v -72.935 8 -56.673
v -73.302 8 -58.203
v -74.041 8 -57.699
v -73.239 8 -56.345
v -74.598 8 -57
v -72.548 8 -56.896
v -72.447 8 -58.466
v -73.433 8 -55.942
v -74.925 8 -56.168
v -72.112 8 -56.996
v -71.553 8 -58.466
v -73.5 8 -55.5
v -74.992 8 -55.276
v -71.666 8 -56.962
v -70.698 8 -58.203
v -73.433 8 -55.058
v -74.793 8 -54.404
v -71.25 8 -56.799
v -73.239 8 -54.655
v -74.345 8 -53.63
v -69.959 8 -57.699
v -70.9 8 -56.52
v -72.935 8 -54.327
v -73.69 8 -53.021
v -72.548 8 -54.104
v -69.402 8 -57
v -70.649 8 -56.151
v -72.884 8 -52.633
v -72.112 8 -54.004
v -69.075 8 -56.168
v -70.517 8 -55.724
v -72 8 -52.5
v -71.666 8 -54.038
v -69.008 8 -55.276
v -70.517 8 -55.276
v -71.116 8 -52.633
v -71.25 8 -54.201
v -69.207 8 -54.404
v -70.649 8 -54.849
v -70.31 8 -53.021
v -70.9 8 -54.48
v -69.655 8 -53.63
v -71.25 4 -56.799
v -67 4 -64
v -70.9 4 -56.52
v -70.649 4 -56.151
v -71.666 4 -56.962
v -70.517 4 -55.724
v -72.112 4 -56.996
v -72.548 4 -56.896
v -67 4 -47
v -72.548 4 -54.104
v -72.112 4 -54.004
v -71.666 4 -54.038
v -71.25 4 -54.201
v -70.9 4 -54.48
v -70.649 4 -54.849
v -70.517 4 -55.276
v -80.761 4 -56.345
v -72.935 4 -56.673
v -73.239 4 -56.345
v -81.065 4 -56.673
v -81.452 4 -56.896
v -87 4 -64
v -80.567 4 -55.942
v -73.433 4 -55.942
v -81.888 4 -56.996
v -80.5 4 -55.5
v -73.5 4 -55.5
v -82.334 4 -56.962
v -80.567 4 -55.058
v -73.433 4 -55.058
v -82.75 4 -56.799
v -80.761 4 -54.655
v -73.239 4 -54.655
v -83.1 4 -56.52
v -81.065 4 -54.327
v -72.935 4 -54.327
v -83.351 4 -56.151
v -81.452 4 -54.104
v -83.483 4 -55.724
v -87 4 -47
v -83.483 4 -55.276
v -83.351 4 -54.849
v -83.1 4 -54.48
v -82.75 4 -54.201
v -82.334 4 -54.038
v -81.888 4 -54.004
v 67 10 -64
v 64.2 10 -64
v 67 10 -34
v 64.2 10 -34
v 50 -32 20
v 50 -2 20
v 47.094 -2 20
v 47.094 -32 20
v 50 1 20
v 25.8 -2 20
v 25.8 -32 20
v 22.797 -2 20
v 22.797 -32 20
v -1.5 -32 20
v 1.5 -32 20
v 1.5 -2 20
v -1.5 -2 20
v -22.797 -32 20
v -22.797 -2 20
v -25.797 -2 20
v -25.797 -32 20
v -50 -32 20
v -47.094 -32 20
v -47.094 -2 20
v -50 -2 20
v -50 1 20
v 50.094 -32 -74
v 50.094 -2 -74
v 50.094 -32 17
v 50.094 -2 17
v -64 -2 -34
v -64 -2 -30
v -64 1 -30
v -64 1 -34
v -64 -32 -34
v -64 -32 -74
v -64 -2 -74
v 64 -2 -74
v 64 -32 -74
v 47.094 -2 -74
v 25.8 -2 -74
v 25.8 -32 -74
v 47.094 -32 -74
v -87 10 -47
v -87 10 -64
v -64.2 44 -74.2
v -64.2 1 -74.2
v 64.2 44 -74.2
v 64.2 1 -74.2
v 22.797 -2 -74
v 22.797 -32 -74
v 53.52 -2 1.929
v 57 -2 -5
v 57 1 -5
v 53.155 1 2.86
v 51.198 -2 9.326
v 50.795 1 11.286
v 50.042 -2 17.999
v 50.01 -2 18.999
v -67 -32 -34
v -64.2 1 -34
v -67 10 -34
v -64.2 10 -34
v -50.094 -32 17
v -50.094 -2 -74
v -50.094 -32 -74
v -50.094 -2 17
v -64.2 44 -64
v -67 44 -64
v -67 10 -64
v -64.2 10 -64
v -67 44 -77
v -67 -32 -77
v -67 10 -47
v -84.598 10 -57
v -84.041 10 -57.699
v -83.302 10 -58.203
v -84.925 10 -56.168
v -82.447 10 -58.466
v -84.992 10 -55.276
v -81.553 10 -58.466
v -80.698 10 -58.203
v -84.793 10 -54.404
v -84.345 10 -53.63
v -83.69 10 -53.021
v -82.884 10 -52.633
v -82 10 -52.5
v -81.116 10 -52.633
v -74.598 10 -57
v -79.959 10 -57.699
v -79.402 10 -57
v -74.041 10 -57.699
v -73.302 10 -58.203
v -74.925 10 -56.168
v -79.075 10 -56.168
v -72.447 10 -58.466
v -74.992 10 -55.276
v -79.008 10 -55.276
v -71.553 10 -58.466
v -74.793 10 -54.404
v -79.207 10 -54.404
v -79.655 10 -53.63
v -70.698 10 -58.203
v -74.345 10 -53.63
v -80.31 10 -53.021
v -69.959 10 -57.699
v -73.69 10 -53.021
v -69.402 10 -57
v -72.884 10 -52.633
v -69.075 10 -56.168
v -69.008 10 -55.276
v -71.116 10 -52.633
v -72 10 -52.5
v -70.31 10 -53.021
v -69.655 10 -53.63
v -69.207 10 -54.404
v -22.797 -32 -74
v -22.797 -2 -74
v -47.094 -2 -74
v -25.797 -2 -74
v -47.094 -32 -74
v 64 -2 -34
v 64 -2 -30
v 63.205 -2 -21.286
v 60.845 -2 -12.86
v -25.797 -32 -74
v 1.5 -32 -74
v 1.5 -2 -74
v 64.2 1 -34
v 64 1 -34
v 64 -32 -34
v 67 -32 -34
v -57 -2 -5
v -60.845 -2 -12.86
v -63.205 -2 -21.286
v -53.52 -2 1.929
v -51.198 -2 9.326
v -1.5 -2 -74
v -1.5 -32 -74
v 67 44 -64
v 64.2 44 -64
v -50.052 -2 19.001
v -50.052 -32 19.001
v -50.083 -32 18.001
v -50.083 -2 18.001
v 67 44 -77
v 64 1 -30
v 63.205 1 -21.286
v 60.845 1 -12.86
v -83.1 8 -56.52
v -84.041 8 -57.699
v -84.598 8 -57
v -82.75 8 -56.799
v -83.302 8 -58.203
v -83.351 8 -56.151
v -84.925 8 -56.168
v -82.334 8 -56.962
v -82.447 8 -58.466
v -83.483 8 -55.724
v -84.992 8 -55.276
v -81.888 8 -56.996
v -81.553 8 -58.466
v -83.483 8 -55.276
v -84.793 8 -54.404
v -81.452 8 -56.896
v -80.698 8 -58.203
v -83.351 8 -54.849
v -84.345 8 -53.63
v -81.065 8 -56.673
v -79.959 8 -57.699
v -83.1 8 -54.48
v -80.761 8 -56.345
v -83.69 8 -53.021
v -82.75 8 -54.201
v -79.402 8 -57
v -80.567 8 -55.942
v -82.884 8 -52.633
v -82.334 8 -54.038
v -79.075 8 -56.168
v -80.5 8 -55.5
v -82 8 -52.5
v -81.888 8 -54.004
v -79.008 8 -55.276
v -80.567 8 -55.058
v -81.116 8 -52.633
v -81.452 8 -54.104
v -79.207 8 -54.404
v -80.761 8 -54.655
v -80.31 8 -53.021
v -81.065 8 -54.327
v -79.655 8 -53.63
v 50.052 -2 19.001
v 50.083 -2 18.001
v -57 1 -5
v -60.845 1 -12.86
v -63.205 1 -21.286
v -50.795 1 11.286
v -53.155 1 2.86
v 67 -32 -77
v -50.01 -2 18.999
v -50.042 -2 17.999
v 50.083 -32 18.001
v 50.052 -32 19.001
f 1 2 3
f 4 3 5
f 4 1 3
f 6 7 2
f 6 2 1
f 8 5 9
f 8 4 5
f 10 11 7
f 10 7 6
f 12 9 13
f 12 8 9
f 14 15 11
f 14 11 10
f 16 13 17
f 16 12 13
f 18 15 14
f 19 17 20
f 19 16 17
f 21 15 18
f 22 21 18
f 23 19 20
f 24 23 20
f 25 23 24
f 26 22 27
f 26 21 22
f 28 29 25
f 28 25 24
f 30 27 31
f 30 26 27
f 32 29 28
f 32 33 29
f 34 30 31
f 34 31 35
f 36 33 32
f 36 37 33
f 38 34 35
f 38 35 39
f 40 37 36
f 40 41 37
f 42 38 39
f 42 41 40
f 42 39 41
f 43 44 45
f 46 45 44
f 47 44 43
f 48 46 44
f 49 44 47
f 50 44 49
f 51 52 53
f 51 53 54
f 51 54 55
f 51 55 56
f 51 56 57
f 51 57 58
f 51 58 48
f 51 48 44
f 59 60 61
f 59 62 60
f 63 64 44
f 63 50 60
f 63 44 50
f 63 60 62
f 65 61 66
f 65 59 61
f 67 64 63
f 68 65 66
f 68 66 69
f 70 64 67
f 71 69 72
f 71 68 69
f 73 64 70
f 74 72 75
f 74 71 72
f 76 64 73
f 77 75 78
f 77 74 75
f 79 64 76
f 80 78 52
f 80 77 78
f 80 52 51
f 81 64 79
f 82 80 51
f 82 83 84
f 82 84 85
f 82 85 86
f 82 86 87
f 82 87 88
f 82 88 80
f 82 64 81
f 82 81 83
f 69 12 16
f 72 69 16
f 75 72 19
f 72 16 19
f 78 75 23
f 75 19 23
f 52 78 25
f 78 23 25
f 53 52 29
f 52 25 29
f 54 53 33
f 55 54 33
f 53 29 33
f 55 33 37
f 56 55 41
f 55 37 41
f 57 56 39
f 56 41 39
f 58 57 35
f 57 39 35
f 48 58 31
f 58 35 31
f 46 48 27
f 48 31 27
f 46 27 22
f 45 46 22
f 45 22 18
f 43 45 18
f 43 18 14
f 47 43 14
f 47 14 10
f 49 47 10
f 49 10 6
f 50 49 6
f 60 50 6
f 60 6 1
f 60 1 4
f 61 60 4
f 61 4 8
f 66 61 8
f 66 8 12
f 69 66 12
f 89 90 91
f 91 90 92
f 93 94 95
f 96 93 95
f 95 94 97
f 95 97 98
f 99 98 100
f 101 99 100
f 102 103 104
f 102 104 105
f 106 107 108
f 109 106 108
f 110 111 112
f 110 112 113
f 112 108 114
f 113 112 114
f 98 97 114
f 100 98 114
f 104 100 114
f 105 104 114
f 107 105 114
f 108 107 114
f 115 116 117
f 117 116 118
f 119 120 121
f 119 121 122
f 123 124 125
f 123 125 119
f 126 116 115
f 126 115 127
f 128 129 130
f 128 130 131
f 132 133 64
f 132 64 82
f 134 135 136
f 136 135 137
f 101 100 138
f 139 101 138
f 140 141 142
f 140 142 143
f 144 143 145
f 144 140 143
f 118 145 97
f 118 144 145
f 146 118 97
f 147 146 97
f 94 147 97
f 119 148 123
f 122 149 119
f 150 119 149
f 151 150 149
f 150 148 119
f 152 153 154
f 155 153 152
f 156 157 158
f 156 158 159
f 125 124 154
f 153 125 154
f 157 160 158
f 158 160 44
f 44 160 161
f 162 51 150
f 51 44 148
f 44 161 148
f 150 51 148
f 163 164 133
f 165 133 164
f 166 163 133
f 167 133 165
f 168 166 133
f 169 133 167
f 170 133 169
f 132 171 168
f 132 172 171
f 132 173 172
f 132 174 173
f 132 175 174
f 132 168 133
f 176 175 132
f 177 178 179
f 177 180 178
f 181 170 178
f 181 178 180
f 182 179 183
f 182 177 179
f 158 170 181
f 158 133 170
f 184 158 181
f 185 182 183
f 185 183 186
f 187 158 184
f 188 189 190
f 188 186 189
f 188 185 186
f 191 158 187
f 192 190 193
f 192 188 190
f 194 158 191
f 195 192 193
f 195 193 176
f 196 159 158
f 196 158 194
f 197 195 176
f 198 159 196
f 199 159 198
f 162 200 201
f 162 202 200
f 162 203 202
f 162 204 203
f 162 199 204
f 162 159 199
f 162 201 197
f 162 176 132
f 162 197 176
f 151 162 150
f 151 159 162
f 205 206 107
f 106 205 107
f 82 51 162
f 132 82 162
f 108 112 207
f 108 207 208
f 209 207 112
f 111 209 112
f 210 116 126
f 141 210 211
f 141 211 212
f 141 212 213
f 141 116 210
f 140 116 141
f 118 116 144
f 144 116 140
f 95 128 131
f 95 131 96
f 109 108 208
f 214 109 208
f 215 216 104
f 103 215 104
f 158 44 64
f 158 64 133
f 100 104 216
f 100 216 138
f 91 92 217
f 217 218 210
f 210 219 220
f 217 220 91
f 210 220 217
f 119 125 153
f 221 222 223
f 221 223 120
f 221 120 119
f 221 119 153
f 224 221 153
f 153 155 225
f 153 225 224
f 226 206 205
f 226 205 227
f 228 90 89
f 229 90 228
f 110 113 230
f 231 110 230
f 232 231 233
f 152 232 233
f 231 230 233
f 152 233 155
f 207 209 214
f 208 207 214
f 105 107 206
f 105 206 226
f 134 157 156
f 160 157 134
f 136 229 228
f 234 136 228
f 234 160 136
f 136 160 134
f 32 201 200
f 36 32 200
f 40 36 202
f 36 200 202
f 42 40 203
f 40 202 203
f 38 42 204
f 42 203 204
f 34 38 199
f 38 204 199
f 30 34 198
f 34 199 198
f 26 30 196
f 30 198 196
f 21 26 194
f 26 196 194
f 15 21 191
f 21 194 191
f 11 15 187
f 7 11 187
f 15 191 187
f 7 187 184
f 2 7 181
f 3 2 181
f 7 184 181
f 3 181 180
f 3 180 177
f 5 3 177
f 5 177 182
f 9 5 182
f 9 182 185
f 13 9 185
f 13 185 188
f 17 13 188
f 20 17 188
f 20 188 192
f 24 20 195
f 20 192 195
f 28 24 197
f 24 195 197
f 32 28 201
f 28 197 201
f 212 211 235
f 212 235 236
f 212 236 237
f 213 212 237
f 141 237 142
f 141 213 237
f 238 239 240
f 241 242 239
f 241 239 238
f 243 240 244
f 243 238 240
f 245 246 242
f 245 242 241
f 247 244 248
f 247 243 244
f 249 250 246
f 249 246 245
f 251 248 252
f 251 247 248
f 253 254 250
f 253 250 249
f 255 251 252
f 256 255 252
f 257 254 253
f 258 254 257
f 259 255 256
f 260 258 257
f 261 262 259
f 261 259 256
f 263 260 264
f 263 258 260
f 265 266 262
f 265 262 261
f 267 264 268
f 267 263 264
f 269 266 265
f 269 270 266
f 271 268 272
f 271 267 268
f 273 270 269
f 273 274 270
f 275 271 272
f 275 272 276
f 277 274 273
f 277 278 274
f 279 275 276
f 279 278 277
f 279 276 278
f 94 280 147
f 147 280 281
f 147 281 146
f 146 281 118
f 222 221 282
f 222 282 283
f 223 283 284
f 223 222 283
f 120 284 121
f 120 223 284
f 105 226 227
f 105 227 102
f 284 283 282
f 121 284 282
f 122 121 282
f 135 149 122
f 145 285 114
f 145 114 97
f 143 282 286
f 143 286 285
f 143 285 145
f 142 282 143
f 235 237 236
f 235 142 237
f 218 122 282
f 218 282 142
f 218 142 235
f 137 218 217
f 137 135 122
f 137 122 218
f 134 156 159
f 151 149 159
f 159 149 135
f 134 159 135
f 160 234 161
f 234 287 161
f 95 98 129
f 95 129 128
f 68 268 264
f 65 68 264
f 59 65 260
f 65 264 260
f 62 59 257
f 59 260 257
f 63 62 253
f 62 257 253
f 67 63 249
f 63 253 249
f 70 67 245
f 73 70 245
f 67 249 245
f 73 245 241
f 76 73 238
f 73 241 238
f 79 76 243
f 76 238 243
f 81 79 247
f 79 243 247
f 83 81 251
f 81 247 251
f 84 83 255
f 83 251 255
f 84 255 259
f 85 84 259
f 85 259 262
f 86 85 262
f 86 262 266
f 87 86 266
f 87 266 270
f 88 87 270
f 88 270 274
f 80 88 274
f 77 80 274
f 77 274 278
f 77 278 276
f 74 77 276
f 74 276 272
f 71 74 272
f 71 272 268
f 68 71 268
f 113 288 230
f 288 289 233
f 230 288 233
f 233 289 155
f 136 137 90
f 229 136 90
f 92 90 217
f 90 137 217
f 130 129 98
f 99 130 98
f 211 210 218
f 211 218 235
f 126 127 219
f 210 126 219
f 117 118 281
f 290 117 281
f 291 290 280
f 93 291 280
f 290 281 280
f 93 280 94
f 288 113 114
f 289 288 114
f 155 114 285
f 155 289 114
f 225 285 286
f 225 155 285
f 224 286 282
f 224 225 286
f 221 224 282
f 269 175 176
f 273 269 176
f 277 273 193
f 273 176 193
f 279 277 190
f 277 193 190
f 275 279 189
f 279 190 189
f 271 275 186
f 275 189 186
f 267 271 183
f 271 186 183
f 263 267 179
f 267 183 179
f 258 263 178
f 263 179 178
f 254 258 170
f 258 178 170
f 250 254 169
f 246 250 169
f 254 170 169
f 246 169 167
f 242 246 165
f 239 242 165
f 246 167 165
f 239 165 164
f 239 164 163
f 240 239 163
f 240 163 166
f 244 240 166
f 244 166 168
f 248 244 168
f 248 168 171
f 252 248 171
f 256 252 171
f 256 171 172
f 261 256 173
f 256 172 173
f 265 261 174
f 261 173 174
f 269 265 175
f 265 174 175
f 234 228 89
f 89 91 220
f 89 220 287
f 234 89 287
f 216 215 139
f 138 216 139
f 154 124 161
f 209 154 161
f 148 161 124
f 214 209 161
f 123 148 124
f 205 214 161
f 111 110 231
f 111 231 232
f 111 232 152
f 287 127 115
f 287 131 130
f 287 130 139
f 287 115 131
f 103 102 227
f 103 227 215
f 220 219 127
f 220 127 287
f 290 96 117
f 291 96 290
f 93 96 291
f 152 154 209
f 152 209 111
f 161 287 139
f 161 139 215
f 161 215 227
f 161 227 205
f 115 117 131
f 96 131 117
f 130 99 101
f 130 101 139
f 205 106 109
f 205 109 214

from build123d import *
from build123d.topology import SkipClean

# Parameters (mm, degrees)
SKETCH_1_R           = 10
SKETCH_1_W           = 40
SKETCH_1_H           = 40
EXTRUDE_1_DEPTH      = 2
EXTRUDE_START        = 2
SKETCH_2_R           = 10
EXTRUDE_2_DEPTH      = 2
SKETCH_4_R           = 15
EXTRUDE_3_DEPTH      = 8
EXTRUDE_START_2      = -8
SKETCH_7_R           = 15
SKETCH_7_R_2         = 10
EXTRUDE_4_DEPTH      = 8
SKETCH_11_R          = 15
SKETCH_11_R_2        = 10
EXTRUDE_5_DEPTH      = 8
FILLET_1_R           = 8
EXTRUDE_START_3      = -1
SKETCH_20_R          = 10
EXTRUDE_7_DEPTH      = 1
CUT_EXTRUDE_START    = -4
CUT_EXTRUDE_2_DEPTH  = 4
EXTRUDE_8_DEPTH      = 4
SKETCH_28_R          = 10
EXTRUDE_10_DEPTH     = 4
SKETCH_29_R          = 10
CUT_EXTRUDE_5_DEPTH  = 3
CUT_EXTRUDE_START_2  = -8
CUT_EXTRUDE_6_DEPTH  = 8
SKETCH_32_R          = 10
EXTRUDE_11_DEPTH     = 4
SKETCH_33_W          = 128
SKETCH_33_H          = 1
CUT_EXTRUDE_7_DEPTH  = 100
SKETCH_34_W          = 128
SKETCH_34_H          = 3
EXTRUDE_12_DEPTH     = 42
EXTRUDE_13_DEPTH     = 3
SKETCH_36_W          = 128
SKETCH_36_H          = 3
EXTRUDE_14_DEPTH     = 30
EXTRUDE_15_DEPTH     = 30
SKETCH_40_W          = 128
SKETCH_40_H          = 3
EXTRUDE_16_DEPTH     = 30
SKETCH_41_W          = 3
SKETCH_41_H          = 51
EXTRUDE_17_DEPTH     = 30
SKETCH_42_W          = 128
SKETCH_42_H          = 0.2
SKETCH_42_W_2        = 0.2
SKETCH_42_H_2        = 40
CUT_EXTRUDE_8_DEPTH  = 42
EXTRUDE_18_DEPTH     = 20
CUT_EXTRUDE_9_DEPTH  = 20
SKETCH_45_R          = 5
CUT_EXTRUDE_10_DEPTH = 3
SKETCH_46_W          = 17
SKETCH_46_H          = 6
EXTRUDE_19_DEPTH     = 20
SKETCH_47_W          = 20
SKETCH_47_H          = 6
CUT_EXTRUDE_11_DEPTH = 20
CUT_EXTRUDE_12_DEPTH = 20
SKETCH_49_R          = 3
CUT_EXTRUDE_13_DEPTH = 2
SKETCH_50_W          = 30
SKETCH_50_H          = 33
CUT_EXTRUDE_14_DEPTH = 3
SKETCH_51_W          = 128.4
SKETCH_51_H          = 2.8
EXTRUDE_20_DEPTH     = 1
SKETCH_52_W          = 128
SKETCH_52_H          = 3
SKETCH_52_W_2        = 94.187125454
CUT_EXTRUDE_15_DEPTH = 30
SKETCH_53_W          = 3
SKETCH_53_H          = 40
EXTRUDE_21_DEPTH     = 30
SKETCH_54_W          = 1.5
SKETCH_54_H          = 47
SKETCH_54_W_2        = 3
SKETCH_54_H_2        = 94
SKETCH_54_W_3        = 1.502846805
EXTRUDE_23_DEPTH     = 30
SKETCH_55_W          = 30
SKETCH_55_H          = 34
CUT_EXTRUDE_16_DEPTH = 200


with BuildPart() as part:
    # 草图1 → 凸台-拉伸1 (new body)
    with BuildSketch(Plane(origin=(0, 0, 0), x_dir=(1, 0, 0), z_dir=(0, 1, 0))):
        with BuildLine():
            Line((0, -20), (50, -20))
            Line((50, -20), (57, -20))
            ThreePointArc((57, -20), (76.798989873, -11.798989873), (85, 8))
            Line((85, 8), (85, 52))
            Line((85, 52), (43, 52))
            Line((43, 52), (43, 72))
            Line((43, 72), (-43, 72))
            Line((-43, 72), (-43, 52))
            Line((-43, 52), (-85, 52))
            Line((-85, 52), (-85, 50))
            Line((-85, 50), (-85, 8))
            ThreePointArc((-85, 8), (-76.798989873, -11.798989873), (-57, -20))
            Line((-57, -20), (-50, -20))
            Line((-50, -20), (0, -20))
        make_face()
        with Locations(Location((18, 0, 0), (0, 0, 270))):
            Circle(SKETCH_1_R, mode=Mode.SUBTRACT)
        with Locations(Location((-18, 0, 0), (0, 0, 270))):
            Circle(SKETCH_1_R, mode=Mode.SUBTRACT)
        with Locations((-21, 50)):
            Rectangle(SKETCH_1_W, SKETCH_1_H, mode=Mode.SUBTRACT)
        with Locations((21, 50)):
            Rectangle(SKETCH_1_W, SKETCH_1_H, mode=Mode.SUBTRACT)
        with Locations((-63, 30)):
            Rectangle(SKETCH_1_W, SKETCH_1_H, mode=Mode.SUBTRACT)
        with Locations((63, 30)):
            Rectangle(SKETCH_1_W, SKETCH_1_H, mode=Mode.SUBTRACT)
    extrude(amount=EXTRUDE_1_DEPTH)

    # 草图2 → 凸台-拉伸2 (add)
    with SkipClean():  # the faces are left unmerged after this step: merging them gives an invalid solid
        with BuildSketch(Plane.XZ.offset(EXTRUDE_START)):
            with BuildLine():
                Line((-85, -8), (-85, -52))
                Line((-85, -52), (-43, -52))
                Line((-43, -52), (-43, -72))
                Line((-43, -72), (43, -72))
                Line((43, -72), (43, -52))
                Line((43, -52), (85, -52))
                Line((85, -52), (85, -8))
                ThreePointArc((85, -8), (76.798989873, 11.798989873), (57, 20))
                Line((57, 20), (-57, 20))
                ThreePointArc((-57, 20), (-76.798989873, 11.798989873), (-85, -8))
            make_face()
            with Locations(Location((-18, 0, 0), (0, 0, 270))):
                Circle(SKETCH_2_R, mode=Mode.SUBTRACT)
            with Locations(Location((18, 0, 0), (0, 0, 270))):
                Circle(SKETCH_2_R, mode=Mode.SUBTRACT)
        extrude(amount=-EXTRUDE_2_DEPTH)

    # 草图4 → 凸台-拉伸3 (add)
    with BuildSketch(Plane(origin=(0, 2, 0), x_dir=(1, 0, 0), z_dir=(0, 1, 0))):
        with BuildLine():
            Line((-50, -20), (0, -20))
            Line((0, -20), (50, -20))
            ThreePointArc((50, -20), (0, 30), (-50, -20))
        make_face()
        with Locations(Location((-18, 0, 0), (0, 0, 270))):
            Circle(SKETCH_4_R, mode=Mode.SUBTRACT)
        with Locations(Location((18, 0, 0), (0, 0, 270))):
            Circle(SKETCH_4_R, mode=Mode.SUBTRACT)
    extrude(amount=EXTRUDE_3_DEPTH)

    # loft up to a face of the part (loft_1)
    loft([Face(Wire([part.edges().sort_by_distance((-28.934529411, 10, -10.268206589))[0]])), Face(Wire([part.edges().sort_by_distance((-25.289686274, 2, -6.845471059))[0]]))], mode=Mode.SUBTRACT)

    # 草图7 → 凸台-拉伸4 (add)
    with BuildSketch(Plane(origin=(0, 10, 0), x_dir=(1, 0, 0), z_dir=(0, 1, 0)).offset(EXTRUDE_START_2)):
        with Locations((-18, 0)):
            Circle(SKETCH_7_R)
        with Locations(Location((-18, 0, 0), (0, 0, 90))):
            Circle(SKETCH_7_R_2, mode=Mode.SUBTRACT)
    extrude(amount=EXTRUDE_4_DEPTH)

    # 切除-放样2: read off the stored shape, not the designer's step
    # 切除-放样2: loft between two sections, ruled curve by curve
    loft_2_from = [
        Edge.make_bspline([(-3.624862246, 10, -4.284321948), (4.943781649, 10, 24.465953561), (-23.806493859, 10, 33.034597456), (-32.375137754, 10, 4.284321948), (-40.943781649, 10, -24.465953561), (-12.193506141, 10, -33.034597456), (-3.624862246, 10, -4.284321948)], [0, 0, 0, 0, 0.5, 0.5, 0.5, 1, 1, 1, 1], 3, [1, 0.333333333, 0.333333333, 1, 0.333333333, 0.333333333, 1]),
    ]
    loft_2_to = [
        Edge.make_bspline([(-10.022055605, 2, -6.029295417), (2.036535229, 2, 9.926593374), (-13.919353562, 2, 21.985184208), (-25.977944395, 2, 6.029295417), (-38.036535229, 2, -9.926593374), (-22.080646438, 2, -21.985184208), (-10.022055605, 2, -6.029295417)], [0, 0, 0, 0, 0.5, 0.5, 0.5, 1, 1, 1, 1], 3, [1, 0.333333333, 0.333333333, 1, 0.333333333, 0.333333333, 1]),
    ]
    loft_2 = Solid(Shell([*[Face.make_surface_from_curves(loft_2_from[k], loft_2_to[k]) for k in range(1)], Face(Wire(loft_2_from)), Face(Wire(loft_2_to))]))
    add(loft_2, mode=Mode.SUBTRACT)

    # 草图11 → 凸台-拉伸5 (add)
    with BuildSketch(Plane(origin=(0, 10, 0), x_dir=(1, 0, 0), z_dir=(0, 1, 0)).offset(EXTRUDE_START_2)):
        with Locations((18, 0)):
            Circle(SKETCH_11_R)
        with Locations(Location((18, 0, 0), (0, 0, 90))):
            Circle(SKETCH_11_R_2, mode=Mode.SUBTRACT)
    extrude(amount=EXTRUDE_5_DEPTH)

    # 切除-放样3: read off the stored shape, not the designer's step
    # 切除-放样3: loft between two sections, ruled curve by curve
    loft_3_from = [
        Edge.make_bspline([(32.65702084, 10, -3.189316556), (39.035653951, 10, 26.124725125), (9.721612271, 10, 32.503358236), (3.34297916, 10, 3.189316556), (-3.035653951, 10, -26.124725125), (26.278387729, 10, -32.503358236), (32.65702084, 10, -3.189316556)], [0, 0, 0, 0, 0.5, 0.5, 0.5, 1, 1, 1, 1], 3, [1, 0.333333333, 0.333333333, 1, 0.333333333, 0.333333333, 1]),
    ]
    loft_3_to = [
        Edge.make_bspline([(26.664439789, 2, -4.992743049), (36.649925886, 2, 12.336136528), (19.321046309, 2, 22.321622626), (9.335560211, 2, 4.992743049), (-0.649925886, 2, -12.336136528), (16.678953691, 2, -22.321622626), (26.664439789, 2, -4.992743049)], [0, 0, 0, 0, 0.5, 0.5, 0.5, 1, 1, 1, 1], 3, [1, 0.333333333, 0.333333333, 1, 0.333333333, 0.333333333, 1]),
    ]
    loft_3 = Solid(Shell([*[Face.make_surface_from_curves(loft_3_from[k], loft_3_to[k]) for k in range(1)], Face(Wire(loft_3_from)), Face(Wire(loft_3_to))]))
    add(loft_3, mode=Mode.SUBTRACT)

    # 圆角1
    fillet_1_edges = [part.edges().sort_by_distance(p)[0] for p in [
        (0, 10, -30),
    ]]
    fillet(fillet_1_edges, radius=FILLET_1_R - 0.0001)  # a hair under: the kernel refuses the full size

    # 草图20 → 凸台-拉伸7 (add)
    with BuildSketch(Plane(origin=(0, 2, 0), x_dir=(1, 0, 0), z_dir=(0, 1, 0)).offset(EXTRUDE_START_3)):
        with Locations(Location((-18, 0, 0), (0, 0, 90))):
            Circle(SKETCH_20_R)
        with Locations(Location((18, 0, 0), (0, 0, 90))):
            Circle(SKETCH_20_R)
    extrude(amount=EXTRUDE_7_DEPTH)

    # 草图21 → 切除-拉伸2 (cut)
    with BuildSketch(Plane(origin=(0, 2, 0), x_dir=(1, 0, 0), z_dir=(0, 1, 0)).offset(CUT_EXTRUDE_START)):
        with BuildLine():
            Line((-50, -20), (-103.463459811, -20))
            Line((-103.463459811, -20), (-103.463459811, 85.086510942))
            Line((-103.463459811, 85.086510942), (103.21519716, 85.086510942))
            Line((103.21519716, 85.086510942), (103.21519716, -20))
            Line((103.21519716, -20), (50, -20))
            ThreePointArc((50, -20), (0, 30), (-50, -20))
        make_face()
    extrude(amount=CUT_EXTRUDE_2_DEPTH, mode=Mode.SUBTRACT)

    # 草图22 → 凸台-拉伸8 (add)
    with BuildSketch(Plane.XZ.offset(2)):
        with BuildLine():
            Line((-64, -30), (-64, -74))
            Line((-64, -74), (0, -74))
            Line((0, -74), (64, -74))
            Line((64, -74), (64, -30))
            ThreePointArc((64, -30), (62.216982092, -17.019245014), (57, -5))
            ThreePointArc((57, -5), (51.783017908, 7.019245014), (50, 20))
            ThreePointArc((50, 20), (0, -30), (-50, 20))
            ThreePointArc((-50, 20), (-51.783017908, 7.019245014), (-57, -5))
            ThreePointArc((-57, -5), (-62.216982092, -17.019245014), (-64, -30))
        make_face()
    extrude(amount=-EXTRUDE_8_DEPTH)

    # 草图28 → 凸台-拉伸10 (add)
    with BuildSketch(Plane.XZ.offset(2)):
        with Locations((-18, 0)):
            Circle(SKETCH_28_R)
        with Locations((18, 0)):
            Circle(SKETCH_28_R)
    extrude(amount=-EXTRUDE_10_DEPTH)

    # 草图29 → 切除-拉伸5 (cut)
    with BuildSketch(Plane(origin=(0, 2, 0), x_dir=(1, 0, 0), z_dir=(0, 1, 0))):
        with Locations(Location((-18, 0, 0), (0, 0, 270))):
            Circle(SKETCH_29_R)
        with Locations(Location((18, 0, 0), (0, 0, 270))):
            Circle(SKETCH_29_R)
    extrude(amount=-CUT_EXTRUDE_5_DEPTH, mode=Mode.SUBTRACT)

    # 草图31 → 切除-拉伸6 (cut)
    with BuildSketch(Plane(origin=(0, 10, 0), x_dir=(1, 0, 0), z_dir=(0, 1, 0)).offset(CUT_EXTRUDE_START_2)):
        with BuildLine():
            Line((-50, -20), (50, -20))
            ThreePointArc((50, -20), (0, 30), (-50, -20))
        make_face()
    extrude(amount=CUT_EXTRUDE_6_DEPTH, mode=Mode.SUBTRACT)

    # 草图32 → 凸台-拉伸11 (add)
    with BuildSketch(Plane(origin=(0, 2, 0), x_dir=(1, 0, 0), z_dir=(0, 1, 0))):
        with Locations((-18, 0)):
            Circle(SKETCH_32_R)
        with Locations((18, 0)):
            Circle(SKETCH_32_R)
    extrude(amount=-EXTRUDE_11_DEPTH)

    # 草图33 → 切除-拉伸7 (cut)
    with BuildSketch(Plane(origin=(0, 0, -74), x_dir=(-1, 0, 0), z_dir=(0, 0, -1))):
        with Locations((0, 1.5)):
            Rectangle(SKETCH_33_W, SKETCH_33_H)
    extrude(amount=-CUT_EXTRUDE_7_DEPTH, mode=Mode.SUBTRACT)



with BuildPart() as body_2:
    # 草图34 → 凸台-拉伸12 (new body)
    with BuildSketch(Plane(origin=(0, 1, 0), x_dir=(1, 0, 0), z_dir=(0, 1, 0))):
        Polygon((64, 77), (64, 74), (64, 34), (67, 34), (67, 77), align=None)
        with Locations((0, 75.5)):
            Rectangle(SKETCH_34_W, SKETCH_34_H)
        Polygon((-64, 34), (-64, 74), (-64, 77), (-67, 77), (-67, 34), align=None)
    extrude(amount=EXTRUDE_12_DEPTH)


with BuildPart() as part_1:
    add(part.part)

    add(body_2.part)  # 凸台-拉伸13 merges body 2
    # 草图35 → 凸台-拉伸13 (add)
    with BuildSketch(Plane.XZ.offset(2)):
        Polygon((-64, -34), (-67, -34), (-67, -77), (67, -77), (67, -34), (64, -34), (64, -74), (-64, -74), align=None)
    extrude(amount=-EXTRUDE_13_DEPTH)

    # 草图36 → 凸台-拉伸14 (add)
    with BuildSketch(Plane.XZ.offset(2)):
        Polygon((64, -34), (64, -74), (64, -77), (67, -77), (67, -34), align=None)
        with Locations((0, -75.5)):
            Rectangle(SKETCH_36_W, SKETCH_36_H)
        Polygon((-64, -34), (-67, -34), (-67, -77), (-64, -77), (-64, -74), align=None)
    extrude(amount=EXTRUDE_14_DEPTH)

    # 草图37 → 凸台-拉伸15 (add)
    with BuildSketch(Plane(origin=(0, -2, 0), x_dir=(-1, 0, 0), z_dir=(0, -1, 0))):
        with BuildLine():
            Line((0, -17), (-50.093562727, -17))
            ThreePointArc((-50.093562727, -17), (-50.07016636, -18.500729321), (-50, -20))
            Line((-50, -20), (50, -20))
            ThreePointArc((50, -20), (50.07016636, -18.500729321), (50.093562727, -17))
            Line((50.093562727, -17), (0, -17))
        make_face()
    extrude(amount=EXTRUDE_15_DEPTH)

    # 草图40 → 凸台-拉伸16 (add)
    with BuildSketch(Plane.XZ.offset(2)):
        with Locations((0, -35.5)):
            Rectangle(SKETCH_40_W, SKETCH_40_H)
    extrude(amount=EXTRUDE_16_DEPTH)

    # 草图41 → 凸台-拉伸17 (add)
    with BuildSketch(Plane.XZ.offset(2)):
        with Locations((-48.593562727, -8.5)):
            Rectangle(SKETCH_41_W, SKETCH_41_H)
        with Locations((48.593562727, -8.5)):
            Rectangle(SKETCH_41_W, SKETCH_41_H)
    extrude(amount=EXTRUDE_17_DEPTH)

    # 草图42 → 切除-拉伸8 (cut)
    with BuildSketch(Plane(origin=(0, 43, 0), x_dir=(1, 0, 0), z_dir=(0, 1, 0))):
        with Locations((0, 74.1)):
            Rectangle(SKETCH_42_W, SKETCH_42_H)
        with Locations((-64.1, 74.1)):
            Rectangle(SKETCH_42_W_2, SKETCH_42_H)
        with Locations((-64.1, 54)):
            Rectangle(SKETCH_42_W_2, SKETCH_42_H_2)
        with Locations((64.1, 54)):
            Rectangle(SKETCH_42_W_2, SKETCH_42_H_2)
        with Locations((64.1, 74.1)):
            Rectangle(SKETCH_42_W_2, SKETCH_42_H)
    extrude(amount=-CUT_EXTRUDE_8_DEPTH, mode=Mode.SUBTRACT)

    # 草图43 → 凸台-拉伸18 (add)
    with BuildSketch(Plane.ZY.offset(67)):
        Polygon((-45.5, -2), (-65.5, -2), (-65.5, 4), (-55.5, 4), (-45.5, 4), align=None)
    extrude(amount=EXTRUDE_18_DEPTH)

    # 草图44 → 切除-拉伸9 (cut)
    with BuildSketch(Plane(origin=(0, 4, 0), x_dir=(1, 0, 0), z_dir=(0, 1, 0))):
        with BuildLine():
            ThreePointArc((-74.4, 55.5), (-76.005023076, 57.902086785), (-78.838477631, 57.338477631))
            Line((-78.838477631, 57.338477631), (-75.161522369, 53.661522369))
            ThreePointArc((-75.161522369, 53.661522369), (-74.597913215, 54.505023076), (-74.4, 55.5))
        make_face()
        with BuildLine():
            Line((-75.161522369, 53.661522369), (-78.838477631, 57.338477631))
            ThreePointArc((-78.838477631, 57.338477631), (-78.838477631, 53.661522369), (-75.161522369, 53.661522369))
        make_face()
    extrude(amount=-CUT_EXTRUDE_9_DEPTH, mode=Mode.SUBTRACT)

    # 草图45 → 切除-拉伸10 (cut)
    with BuildSketch(Plane(origin=(0, 4, 0), x_dir=(1, 0, 0), z_dir=(0, 1, 0))):
        with Locations(Location((-77, 55.5, 0), (0, 0, 270))):
            Circle(SKETCH_45_R)
    extrude(amount=-CUT_EXTRUDE_10_DEPTH, mode=Mode.SUBTRACT)

    # 草图46 → 凸台-拉伸19 (add)
    with BuildSketch(Plane.ZY.offset(67)):
        with Locations((-55.5, 7)):
            Rectangle(SKETCH_46_W, SKETCH_46_H)
    extrude(amount=EXTRUDE_19_DEPTH)

    # 草图47 → 切除-拉伸11 (cut)
    with BuildSketch(Plane.ZY.offset(87)):
        with Locations((-55.5, 1)):
            Rectangle(SKETCH_47_W, SKETCH_47_H)
    extrude(amount=-CUT_EXTRUDE_11_DEPTH, mode=Mode.SUBTRACT)

    # 草图48 → 切除-拉伸12 (cut)
    with BuildSketch(Plane(origin=(0, 10, 0), x_dir=(1, 0, 0), z_dir=(0, 1, 0))):
        with BuildLine():
            ThreePointArc((-83.5, 55.5), (-82, 54), (-80.5, 55.5))
            Line((-80.5, 55.5), (-83.5, 55.5))
        make_face()
        with BuildLine():
            Line((-83.5, 55.5), (-80.5, 55.5))
            ThreePointArc((-80.5, 55.5), (-82, 57), (-83.5, 55.5))
        make_face()
        with BuildLine():
            ThreePointArc((-70.5, 55.5), (-72, 57), (-73.5, 55.5))
            Line((-73.5, 55.5), (-70.5, 55.5))
        make_face()
        with BuildLine():
            Line((-70.5, 55.5), (-73.5, 55.5))
            ThreePointArc((-73.5, 55.5), (-72, 54), (-70.5, 55.5))
        make_face()
    extrude(amount=-CUT_EXTRUDE_12_DEPTH, mode=Mode.SUBTRACT)

    # 草图49 → 切除-拉伸13 (cut)
    with BuildSketch(Plane(origin=(0, 10, 0), x_dir=(1, 0, 0), z_dir=(0, 1, 0))):
        with Locations(Location((-82, 55.5, 0), (0, 0, 270))):
            Circle(SKETCH_49_R)
        with Locations(Location((-72, 55.5, 0), (0, 0, 270))):
            Circle(SKETCH_49_R)
    extrude(amount=-CUT_EXTRUDE_13_DEPTH, mode=Mode.SUBTRACT)

    # 草图50 → 切除-拉伸14 (cut)
    with BuildSketch(Plane.ZY.offset(67)):
        with Locations((-49, 26.5)):
            Rectangle(SKETCH_50_W, SKETCH_50_H)
    extrude(amount=-CUT_EXTRUDE_14_DEPTH, mode=Mode.SUBTRACT)

    # 草图51 → 凸台-拉伸20 (add)
    with BuildSketch(Plane(origin=(0, 43, 0), x_dir=(1, 0, 0), z_dir=(0, 1, 0))):
        with Locations((0, 75.6)):
            Rectangle(SKETCH_51_W, SKETCH_51_H)
        Polygon((-67, 64), (-64.2, 64), (-64.2, 74.2), (-64.2, 77), (-67, 77), align=None)
        Polygon((64.2, 77), (64.2, 74.2), (64.2, 34), (67, 34), (67, 77), align=None)
    extrude(amount=EXTRUDE_20_DEPTH)

    # 草图52 → 切除-拉伸15 (cut)
    with BuildSketch(Plane.XZ.offset(32)):
        with Locations((0, -35.5)):
            Rectangle(SKETCH_52_W, SKETCH_52_H)
        with Locations((0, 18.5)):
            Rectangle(SKETCH_52_W_2, SKETCH_52_H)
    extrude(amount=-CUT_EXTRUDE_15_DEPTH, mode=Mode.SUBTRACT)

    # 草图53 → 凸台-拉伸21 (add)
    with BuildSketch(Plane.XZ.offset(2)):
        with Locations((-48.593562727, -54)):
            Rectangle(SKETCH_53_W, SKETCH_53_H)
        with Locations((48.593562727, -54)):
            Rectangle(SKETCH_53_W, SKETCH_53_H)
    extrude(amount=EXTRUDE_21_DEPTH)

    # 草图54 → 凸台-拉伸23 (add)
    with BuildSketch(Plane.XZ.offset(2)):
        Polygon((-22.796781363, 20), (-24.296781363, 20), (-24.296781363, -27), (-24.296781363, -74), (-22.796781363, -74), align=None)
        with Locations((-25.046781363, -3.5)):
            Rectangle(SKETCH_54_W, SKETCH_54_H)
        with Locations((-25.046781363, -50.5)):
            Rectangle(SKETCH_54_W, SKETCH_54_H)
        with Locations((0, -27)):
            Rectangle(SKETCH_54_W_2, SKETCH_54_H_2)
        with Locations((25.048204766, -3.5)):
            Rectangle(SKETCH_54_W_3, SKETCH_54_H)
        with Locations((23.546781363, -3.5)):
            Rectangle(SKETCH_54_W, SKETCH_54_H)
        with Locations((23.546781363, -50.5)):
            Rectangle(SKETCH_54_W, SKETCH_54_H)
        with Locations((25.048204766, -50.5)):
            Rectangle(SKETCH_54_W_3, SKETCH_54_H)
    extrude(amount=EXTRUDE_23_DEPTH)

    # 草图55 → 切除-拉伸16 (cut)
    with BuildSketch(Plane.ZY.offset(67)):
        with Locations((-49, 27)):
            Rectangle(SKETCH_55_W, SKETCH_55_H)
    extrude(amount=-CUT_EXTRUDE_16_DEPTH, mode=Mode.SUBTRACT)


solid = part_1.part
